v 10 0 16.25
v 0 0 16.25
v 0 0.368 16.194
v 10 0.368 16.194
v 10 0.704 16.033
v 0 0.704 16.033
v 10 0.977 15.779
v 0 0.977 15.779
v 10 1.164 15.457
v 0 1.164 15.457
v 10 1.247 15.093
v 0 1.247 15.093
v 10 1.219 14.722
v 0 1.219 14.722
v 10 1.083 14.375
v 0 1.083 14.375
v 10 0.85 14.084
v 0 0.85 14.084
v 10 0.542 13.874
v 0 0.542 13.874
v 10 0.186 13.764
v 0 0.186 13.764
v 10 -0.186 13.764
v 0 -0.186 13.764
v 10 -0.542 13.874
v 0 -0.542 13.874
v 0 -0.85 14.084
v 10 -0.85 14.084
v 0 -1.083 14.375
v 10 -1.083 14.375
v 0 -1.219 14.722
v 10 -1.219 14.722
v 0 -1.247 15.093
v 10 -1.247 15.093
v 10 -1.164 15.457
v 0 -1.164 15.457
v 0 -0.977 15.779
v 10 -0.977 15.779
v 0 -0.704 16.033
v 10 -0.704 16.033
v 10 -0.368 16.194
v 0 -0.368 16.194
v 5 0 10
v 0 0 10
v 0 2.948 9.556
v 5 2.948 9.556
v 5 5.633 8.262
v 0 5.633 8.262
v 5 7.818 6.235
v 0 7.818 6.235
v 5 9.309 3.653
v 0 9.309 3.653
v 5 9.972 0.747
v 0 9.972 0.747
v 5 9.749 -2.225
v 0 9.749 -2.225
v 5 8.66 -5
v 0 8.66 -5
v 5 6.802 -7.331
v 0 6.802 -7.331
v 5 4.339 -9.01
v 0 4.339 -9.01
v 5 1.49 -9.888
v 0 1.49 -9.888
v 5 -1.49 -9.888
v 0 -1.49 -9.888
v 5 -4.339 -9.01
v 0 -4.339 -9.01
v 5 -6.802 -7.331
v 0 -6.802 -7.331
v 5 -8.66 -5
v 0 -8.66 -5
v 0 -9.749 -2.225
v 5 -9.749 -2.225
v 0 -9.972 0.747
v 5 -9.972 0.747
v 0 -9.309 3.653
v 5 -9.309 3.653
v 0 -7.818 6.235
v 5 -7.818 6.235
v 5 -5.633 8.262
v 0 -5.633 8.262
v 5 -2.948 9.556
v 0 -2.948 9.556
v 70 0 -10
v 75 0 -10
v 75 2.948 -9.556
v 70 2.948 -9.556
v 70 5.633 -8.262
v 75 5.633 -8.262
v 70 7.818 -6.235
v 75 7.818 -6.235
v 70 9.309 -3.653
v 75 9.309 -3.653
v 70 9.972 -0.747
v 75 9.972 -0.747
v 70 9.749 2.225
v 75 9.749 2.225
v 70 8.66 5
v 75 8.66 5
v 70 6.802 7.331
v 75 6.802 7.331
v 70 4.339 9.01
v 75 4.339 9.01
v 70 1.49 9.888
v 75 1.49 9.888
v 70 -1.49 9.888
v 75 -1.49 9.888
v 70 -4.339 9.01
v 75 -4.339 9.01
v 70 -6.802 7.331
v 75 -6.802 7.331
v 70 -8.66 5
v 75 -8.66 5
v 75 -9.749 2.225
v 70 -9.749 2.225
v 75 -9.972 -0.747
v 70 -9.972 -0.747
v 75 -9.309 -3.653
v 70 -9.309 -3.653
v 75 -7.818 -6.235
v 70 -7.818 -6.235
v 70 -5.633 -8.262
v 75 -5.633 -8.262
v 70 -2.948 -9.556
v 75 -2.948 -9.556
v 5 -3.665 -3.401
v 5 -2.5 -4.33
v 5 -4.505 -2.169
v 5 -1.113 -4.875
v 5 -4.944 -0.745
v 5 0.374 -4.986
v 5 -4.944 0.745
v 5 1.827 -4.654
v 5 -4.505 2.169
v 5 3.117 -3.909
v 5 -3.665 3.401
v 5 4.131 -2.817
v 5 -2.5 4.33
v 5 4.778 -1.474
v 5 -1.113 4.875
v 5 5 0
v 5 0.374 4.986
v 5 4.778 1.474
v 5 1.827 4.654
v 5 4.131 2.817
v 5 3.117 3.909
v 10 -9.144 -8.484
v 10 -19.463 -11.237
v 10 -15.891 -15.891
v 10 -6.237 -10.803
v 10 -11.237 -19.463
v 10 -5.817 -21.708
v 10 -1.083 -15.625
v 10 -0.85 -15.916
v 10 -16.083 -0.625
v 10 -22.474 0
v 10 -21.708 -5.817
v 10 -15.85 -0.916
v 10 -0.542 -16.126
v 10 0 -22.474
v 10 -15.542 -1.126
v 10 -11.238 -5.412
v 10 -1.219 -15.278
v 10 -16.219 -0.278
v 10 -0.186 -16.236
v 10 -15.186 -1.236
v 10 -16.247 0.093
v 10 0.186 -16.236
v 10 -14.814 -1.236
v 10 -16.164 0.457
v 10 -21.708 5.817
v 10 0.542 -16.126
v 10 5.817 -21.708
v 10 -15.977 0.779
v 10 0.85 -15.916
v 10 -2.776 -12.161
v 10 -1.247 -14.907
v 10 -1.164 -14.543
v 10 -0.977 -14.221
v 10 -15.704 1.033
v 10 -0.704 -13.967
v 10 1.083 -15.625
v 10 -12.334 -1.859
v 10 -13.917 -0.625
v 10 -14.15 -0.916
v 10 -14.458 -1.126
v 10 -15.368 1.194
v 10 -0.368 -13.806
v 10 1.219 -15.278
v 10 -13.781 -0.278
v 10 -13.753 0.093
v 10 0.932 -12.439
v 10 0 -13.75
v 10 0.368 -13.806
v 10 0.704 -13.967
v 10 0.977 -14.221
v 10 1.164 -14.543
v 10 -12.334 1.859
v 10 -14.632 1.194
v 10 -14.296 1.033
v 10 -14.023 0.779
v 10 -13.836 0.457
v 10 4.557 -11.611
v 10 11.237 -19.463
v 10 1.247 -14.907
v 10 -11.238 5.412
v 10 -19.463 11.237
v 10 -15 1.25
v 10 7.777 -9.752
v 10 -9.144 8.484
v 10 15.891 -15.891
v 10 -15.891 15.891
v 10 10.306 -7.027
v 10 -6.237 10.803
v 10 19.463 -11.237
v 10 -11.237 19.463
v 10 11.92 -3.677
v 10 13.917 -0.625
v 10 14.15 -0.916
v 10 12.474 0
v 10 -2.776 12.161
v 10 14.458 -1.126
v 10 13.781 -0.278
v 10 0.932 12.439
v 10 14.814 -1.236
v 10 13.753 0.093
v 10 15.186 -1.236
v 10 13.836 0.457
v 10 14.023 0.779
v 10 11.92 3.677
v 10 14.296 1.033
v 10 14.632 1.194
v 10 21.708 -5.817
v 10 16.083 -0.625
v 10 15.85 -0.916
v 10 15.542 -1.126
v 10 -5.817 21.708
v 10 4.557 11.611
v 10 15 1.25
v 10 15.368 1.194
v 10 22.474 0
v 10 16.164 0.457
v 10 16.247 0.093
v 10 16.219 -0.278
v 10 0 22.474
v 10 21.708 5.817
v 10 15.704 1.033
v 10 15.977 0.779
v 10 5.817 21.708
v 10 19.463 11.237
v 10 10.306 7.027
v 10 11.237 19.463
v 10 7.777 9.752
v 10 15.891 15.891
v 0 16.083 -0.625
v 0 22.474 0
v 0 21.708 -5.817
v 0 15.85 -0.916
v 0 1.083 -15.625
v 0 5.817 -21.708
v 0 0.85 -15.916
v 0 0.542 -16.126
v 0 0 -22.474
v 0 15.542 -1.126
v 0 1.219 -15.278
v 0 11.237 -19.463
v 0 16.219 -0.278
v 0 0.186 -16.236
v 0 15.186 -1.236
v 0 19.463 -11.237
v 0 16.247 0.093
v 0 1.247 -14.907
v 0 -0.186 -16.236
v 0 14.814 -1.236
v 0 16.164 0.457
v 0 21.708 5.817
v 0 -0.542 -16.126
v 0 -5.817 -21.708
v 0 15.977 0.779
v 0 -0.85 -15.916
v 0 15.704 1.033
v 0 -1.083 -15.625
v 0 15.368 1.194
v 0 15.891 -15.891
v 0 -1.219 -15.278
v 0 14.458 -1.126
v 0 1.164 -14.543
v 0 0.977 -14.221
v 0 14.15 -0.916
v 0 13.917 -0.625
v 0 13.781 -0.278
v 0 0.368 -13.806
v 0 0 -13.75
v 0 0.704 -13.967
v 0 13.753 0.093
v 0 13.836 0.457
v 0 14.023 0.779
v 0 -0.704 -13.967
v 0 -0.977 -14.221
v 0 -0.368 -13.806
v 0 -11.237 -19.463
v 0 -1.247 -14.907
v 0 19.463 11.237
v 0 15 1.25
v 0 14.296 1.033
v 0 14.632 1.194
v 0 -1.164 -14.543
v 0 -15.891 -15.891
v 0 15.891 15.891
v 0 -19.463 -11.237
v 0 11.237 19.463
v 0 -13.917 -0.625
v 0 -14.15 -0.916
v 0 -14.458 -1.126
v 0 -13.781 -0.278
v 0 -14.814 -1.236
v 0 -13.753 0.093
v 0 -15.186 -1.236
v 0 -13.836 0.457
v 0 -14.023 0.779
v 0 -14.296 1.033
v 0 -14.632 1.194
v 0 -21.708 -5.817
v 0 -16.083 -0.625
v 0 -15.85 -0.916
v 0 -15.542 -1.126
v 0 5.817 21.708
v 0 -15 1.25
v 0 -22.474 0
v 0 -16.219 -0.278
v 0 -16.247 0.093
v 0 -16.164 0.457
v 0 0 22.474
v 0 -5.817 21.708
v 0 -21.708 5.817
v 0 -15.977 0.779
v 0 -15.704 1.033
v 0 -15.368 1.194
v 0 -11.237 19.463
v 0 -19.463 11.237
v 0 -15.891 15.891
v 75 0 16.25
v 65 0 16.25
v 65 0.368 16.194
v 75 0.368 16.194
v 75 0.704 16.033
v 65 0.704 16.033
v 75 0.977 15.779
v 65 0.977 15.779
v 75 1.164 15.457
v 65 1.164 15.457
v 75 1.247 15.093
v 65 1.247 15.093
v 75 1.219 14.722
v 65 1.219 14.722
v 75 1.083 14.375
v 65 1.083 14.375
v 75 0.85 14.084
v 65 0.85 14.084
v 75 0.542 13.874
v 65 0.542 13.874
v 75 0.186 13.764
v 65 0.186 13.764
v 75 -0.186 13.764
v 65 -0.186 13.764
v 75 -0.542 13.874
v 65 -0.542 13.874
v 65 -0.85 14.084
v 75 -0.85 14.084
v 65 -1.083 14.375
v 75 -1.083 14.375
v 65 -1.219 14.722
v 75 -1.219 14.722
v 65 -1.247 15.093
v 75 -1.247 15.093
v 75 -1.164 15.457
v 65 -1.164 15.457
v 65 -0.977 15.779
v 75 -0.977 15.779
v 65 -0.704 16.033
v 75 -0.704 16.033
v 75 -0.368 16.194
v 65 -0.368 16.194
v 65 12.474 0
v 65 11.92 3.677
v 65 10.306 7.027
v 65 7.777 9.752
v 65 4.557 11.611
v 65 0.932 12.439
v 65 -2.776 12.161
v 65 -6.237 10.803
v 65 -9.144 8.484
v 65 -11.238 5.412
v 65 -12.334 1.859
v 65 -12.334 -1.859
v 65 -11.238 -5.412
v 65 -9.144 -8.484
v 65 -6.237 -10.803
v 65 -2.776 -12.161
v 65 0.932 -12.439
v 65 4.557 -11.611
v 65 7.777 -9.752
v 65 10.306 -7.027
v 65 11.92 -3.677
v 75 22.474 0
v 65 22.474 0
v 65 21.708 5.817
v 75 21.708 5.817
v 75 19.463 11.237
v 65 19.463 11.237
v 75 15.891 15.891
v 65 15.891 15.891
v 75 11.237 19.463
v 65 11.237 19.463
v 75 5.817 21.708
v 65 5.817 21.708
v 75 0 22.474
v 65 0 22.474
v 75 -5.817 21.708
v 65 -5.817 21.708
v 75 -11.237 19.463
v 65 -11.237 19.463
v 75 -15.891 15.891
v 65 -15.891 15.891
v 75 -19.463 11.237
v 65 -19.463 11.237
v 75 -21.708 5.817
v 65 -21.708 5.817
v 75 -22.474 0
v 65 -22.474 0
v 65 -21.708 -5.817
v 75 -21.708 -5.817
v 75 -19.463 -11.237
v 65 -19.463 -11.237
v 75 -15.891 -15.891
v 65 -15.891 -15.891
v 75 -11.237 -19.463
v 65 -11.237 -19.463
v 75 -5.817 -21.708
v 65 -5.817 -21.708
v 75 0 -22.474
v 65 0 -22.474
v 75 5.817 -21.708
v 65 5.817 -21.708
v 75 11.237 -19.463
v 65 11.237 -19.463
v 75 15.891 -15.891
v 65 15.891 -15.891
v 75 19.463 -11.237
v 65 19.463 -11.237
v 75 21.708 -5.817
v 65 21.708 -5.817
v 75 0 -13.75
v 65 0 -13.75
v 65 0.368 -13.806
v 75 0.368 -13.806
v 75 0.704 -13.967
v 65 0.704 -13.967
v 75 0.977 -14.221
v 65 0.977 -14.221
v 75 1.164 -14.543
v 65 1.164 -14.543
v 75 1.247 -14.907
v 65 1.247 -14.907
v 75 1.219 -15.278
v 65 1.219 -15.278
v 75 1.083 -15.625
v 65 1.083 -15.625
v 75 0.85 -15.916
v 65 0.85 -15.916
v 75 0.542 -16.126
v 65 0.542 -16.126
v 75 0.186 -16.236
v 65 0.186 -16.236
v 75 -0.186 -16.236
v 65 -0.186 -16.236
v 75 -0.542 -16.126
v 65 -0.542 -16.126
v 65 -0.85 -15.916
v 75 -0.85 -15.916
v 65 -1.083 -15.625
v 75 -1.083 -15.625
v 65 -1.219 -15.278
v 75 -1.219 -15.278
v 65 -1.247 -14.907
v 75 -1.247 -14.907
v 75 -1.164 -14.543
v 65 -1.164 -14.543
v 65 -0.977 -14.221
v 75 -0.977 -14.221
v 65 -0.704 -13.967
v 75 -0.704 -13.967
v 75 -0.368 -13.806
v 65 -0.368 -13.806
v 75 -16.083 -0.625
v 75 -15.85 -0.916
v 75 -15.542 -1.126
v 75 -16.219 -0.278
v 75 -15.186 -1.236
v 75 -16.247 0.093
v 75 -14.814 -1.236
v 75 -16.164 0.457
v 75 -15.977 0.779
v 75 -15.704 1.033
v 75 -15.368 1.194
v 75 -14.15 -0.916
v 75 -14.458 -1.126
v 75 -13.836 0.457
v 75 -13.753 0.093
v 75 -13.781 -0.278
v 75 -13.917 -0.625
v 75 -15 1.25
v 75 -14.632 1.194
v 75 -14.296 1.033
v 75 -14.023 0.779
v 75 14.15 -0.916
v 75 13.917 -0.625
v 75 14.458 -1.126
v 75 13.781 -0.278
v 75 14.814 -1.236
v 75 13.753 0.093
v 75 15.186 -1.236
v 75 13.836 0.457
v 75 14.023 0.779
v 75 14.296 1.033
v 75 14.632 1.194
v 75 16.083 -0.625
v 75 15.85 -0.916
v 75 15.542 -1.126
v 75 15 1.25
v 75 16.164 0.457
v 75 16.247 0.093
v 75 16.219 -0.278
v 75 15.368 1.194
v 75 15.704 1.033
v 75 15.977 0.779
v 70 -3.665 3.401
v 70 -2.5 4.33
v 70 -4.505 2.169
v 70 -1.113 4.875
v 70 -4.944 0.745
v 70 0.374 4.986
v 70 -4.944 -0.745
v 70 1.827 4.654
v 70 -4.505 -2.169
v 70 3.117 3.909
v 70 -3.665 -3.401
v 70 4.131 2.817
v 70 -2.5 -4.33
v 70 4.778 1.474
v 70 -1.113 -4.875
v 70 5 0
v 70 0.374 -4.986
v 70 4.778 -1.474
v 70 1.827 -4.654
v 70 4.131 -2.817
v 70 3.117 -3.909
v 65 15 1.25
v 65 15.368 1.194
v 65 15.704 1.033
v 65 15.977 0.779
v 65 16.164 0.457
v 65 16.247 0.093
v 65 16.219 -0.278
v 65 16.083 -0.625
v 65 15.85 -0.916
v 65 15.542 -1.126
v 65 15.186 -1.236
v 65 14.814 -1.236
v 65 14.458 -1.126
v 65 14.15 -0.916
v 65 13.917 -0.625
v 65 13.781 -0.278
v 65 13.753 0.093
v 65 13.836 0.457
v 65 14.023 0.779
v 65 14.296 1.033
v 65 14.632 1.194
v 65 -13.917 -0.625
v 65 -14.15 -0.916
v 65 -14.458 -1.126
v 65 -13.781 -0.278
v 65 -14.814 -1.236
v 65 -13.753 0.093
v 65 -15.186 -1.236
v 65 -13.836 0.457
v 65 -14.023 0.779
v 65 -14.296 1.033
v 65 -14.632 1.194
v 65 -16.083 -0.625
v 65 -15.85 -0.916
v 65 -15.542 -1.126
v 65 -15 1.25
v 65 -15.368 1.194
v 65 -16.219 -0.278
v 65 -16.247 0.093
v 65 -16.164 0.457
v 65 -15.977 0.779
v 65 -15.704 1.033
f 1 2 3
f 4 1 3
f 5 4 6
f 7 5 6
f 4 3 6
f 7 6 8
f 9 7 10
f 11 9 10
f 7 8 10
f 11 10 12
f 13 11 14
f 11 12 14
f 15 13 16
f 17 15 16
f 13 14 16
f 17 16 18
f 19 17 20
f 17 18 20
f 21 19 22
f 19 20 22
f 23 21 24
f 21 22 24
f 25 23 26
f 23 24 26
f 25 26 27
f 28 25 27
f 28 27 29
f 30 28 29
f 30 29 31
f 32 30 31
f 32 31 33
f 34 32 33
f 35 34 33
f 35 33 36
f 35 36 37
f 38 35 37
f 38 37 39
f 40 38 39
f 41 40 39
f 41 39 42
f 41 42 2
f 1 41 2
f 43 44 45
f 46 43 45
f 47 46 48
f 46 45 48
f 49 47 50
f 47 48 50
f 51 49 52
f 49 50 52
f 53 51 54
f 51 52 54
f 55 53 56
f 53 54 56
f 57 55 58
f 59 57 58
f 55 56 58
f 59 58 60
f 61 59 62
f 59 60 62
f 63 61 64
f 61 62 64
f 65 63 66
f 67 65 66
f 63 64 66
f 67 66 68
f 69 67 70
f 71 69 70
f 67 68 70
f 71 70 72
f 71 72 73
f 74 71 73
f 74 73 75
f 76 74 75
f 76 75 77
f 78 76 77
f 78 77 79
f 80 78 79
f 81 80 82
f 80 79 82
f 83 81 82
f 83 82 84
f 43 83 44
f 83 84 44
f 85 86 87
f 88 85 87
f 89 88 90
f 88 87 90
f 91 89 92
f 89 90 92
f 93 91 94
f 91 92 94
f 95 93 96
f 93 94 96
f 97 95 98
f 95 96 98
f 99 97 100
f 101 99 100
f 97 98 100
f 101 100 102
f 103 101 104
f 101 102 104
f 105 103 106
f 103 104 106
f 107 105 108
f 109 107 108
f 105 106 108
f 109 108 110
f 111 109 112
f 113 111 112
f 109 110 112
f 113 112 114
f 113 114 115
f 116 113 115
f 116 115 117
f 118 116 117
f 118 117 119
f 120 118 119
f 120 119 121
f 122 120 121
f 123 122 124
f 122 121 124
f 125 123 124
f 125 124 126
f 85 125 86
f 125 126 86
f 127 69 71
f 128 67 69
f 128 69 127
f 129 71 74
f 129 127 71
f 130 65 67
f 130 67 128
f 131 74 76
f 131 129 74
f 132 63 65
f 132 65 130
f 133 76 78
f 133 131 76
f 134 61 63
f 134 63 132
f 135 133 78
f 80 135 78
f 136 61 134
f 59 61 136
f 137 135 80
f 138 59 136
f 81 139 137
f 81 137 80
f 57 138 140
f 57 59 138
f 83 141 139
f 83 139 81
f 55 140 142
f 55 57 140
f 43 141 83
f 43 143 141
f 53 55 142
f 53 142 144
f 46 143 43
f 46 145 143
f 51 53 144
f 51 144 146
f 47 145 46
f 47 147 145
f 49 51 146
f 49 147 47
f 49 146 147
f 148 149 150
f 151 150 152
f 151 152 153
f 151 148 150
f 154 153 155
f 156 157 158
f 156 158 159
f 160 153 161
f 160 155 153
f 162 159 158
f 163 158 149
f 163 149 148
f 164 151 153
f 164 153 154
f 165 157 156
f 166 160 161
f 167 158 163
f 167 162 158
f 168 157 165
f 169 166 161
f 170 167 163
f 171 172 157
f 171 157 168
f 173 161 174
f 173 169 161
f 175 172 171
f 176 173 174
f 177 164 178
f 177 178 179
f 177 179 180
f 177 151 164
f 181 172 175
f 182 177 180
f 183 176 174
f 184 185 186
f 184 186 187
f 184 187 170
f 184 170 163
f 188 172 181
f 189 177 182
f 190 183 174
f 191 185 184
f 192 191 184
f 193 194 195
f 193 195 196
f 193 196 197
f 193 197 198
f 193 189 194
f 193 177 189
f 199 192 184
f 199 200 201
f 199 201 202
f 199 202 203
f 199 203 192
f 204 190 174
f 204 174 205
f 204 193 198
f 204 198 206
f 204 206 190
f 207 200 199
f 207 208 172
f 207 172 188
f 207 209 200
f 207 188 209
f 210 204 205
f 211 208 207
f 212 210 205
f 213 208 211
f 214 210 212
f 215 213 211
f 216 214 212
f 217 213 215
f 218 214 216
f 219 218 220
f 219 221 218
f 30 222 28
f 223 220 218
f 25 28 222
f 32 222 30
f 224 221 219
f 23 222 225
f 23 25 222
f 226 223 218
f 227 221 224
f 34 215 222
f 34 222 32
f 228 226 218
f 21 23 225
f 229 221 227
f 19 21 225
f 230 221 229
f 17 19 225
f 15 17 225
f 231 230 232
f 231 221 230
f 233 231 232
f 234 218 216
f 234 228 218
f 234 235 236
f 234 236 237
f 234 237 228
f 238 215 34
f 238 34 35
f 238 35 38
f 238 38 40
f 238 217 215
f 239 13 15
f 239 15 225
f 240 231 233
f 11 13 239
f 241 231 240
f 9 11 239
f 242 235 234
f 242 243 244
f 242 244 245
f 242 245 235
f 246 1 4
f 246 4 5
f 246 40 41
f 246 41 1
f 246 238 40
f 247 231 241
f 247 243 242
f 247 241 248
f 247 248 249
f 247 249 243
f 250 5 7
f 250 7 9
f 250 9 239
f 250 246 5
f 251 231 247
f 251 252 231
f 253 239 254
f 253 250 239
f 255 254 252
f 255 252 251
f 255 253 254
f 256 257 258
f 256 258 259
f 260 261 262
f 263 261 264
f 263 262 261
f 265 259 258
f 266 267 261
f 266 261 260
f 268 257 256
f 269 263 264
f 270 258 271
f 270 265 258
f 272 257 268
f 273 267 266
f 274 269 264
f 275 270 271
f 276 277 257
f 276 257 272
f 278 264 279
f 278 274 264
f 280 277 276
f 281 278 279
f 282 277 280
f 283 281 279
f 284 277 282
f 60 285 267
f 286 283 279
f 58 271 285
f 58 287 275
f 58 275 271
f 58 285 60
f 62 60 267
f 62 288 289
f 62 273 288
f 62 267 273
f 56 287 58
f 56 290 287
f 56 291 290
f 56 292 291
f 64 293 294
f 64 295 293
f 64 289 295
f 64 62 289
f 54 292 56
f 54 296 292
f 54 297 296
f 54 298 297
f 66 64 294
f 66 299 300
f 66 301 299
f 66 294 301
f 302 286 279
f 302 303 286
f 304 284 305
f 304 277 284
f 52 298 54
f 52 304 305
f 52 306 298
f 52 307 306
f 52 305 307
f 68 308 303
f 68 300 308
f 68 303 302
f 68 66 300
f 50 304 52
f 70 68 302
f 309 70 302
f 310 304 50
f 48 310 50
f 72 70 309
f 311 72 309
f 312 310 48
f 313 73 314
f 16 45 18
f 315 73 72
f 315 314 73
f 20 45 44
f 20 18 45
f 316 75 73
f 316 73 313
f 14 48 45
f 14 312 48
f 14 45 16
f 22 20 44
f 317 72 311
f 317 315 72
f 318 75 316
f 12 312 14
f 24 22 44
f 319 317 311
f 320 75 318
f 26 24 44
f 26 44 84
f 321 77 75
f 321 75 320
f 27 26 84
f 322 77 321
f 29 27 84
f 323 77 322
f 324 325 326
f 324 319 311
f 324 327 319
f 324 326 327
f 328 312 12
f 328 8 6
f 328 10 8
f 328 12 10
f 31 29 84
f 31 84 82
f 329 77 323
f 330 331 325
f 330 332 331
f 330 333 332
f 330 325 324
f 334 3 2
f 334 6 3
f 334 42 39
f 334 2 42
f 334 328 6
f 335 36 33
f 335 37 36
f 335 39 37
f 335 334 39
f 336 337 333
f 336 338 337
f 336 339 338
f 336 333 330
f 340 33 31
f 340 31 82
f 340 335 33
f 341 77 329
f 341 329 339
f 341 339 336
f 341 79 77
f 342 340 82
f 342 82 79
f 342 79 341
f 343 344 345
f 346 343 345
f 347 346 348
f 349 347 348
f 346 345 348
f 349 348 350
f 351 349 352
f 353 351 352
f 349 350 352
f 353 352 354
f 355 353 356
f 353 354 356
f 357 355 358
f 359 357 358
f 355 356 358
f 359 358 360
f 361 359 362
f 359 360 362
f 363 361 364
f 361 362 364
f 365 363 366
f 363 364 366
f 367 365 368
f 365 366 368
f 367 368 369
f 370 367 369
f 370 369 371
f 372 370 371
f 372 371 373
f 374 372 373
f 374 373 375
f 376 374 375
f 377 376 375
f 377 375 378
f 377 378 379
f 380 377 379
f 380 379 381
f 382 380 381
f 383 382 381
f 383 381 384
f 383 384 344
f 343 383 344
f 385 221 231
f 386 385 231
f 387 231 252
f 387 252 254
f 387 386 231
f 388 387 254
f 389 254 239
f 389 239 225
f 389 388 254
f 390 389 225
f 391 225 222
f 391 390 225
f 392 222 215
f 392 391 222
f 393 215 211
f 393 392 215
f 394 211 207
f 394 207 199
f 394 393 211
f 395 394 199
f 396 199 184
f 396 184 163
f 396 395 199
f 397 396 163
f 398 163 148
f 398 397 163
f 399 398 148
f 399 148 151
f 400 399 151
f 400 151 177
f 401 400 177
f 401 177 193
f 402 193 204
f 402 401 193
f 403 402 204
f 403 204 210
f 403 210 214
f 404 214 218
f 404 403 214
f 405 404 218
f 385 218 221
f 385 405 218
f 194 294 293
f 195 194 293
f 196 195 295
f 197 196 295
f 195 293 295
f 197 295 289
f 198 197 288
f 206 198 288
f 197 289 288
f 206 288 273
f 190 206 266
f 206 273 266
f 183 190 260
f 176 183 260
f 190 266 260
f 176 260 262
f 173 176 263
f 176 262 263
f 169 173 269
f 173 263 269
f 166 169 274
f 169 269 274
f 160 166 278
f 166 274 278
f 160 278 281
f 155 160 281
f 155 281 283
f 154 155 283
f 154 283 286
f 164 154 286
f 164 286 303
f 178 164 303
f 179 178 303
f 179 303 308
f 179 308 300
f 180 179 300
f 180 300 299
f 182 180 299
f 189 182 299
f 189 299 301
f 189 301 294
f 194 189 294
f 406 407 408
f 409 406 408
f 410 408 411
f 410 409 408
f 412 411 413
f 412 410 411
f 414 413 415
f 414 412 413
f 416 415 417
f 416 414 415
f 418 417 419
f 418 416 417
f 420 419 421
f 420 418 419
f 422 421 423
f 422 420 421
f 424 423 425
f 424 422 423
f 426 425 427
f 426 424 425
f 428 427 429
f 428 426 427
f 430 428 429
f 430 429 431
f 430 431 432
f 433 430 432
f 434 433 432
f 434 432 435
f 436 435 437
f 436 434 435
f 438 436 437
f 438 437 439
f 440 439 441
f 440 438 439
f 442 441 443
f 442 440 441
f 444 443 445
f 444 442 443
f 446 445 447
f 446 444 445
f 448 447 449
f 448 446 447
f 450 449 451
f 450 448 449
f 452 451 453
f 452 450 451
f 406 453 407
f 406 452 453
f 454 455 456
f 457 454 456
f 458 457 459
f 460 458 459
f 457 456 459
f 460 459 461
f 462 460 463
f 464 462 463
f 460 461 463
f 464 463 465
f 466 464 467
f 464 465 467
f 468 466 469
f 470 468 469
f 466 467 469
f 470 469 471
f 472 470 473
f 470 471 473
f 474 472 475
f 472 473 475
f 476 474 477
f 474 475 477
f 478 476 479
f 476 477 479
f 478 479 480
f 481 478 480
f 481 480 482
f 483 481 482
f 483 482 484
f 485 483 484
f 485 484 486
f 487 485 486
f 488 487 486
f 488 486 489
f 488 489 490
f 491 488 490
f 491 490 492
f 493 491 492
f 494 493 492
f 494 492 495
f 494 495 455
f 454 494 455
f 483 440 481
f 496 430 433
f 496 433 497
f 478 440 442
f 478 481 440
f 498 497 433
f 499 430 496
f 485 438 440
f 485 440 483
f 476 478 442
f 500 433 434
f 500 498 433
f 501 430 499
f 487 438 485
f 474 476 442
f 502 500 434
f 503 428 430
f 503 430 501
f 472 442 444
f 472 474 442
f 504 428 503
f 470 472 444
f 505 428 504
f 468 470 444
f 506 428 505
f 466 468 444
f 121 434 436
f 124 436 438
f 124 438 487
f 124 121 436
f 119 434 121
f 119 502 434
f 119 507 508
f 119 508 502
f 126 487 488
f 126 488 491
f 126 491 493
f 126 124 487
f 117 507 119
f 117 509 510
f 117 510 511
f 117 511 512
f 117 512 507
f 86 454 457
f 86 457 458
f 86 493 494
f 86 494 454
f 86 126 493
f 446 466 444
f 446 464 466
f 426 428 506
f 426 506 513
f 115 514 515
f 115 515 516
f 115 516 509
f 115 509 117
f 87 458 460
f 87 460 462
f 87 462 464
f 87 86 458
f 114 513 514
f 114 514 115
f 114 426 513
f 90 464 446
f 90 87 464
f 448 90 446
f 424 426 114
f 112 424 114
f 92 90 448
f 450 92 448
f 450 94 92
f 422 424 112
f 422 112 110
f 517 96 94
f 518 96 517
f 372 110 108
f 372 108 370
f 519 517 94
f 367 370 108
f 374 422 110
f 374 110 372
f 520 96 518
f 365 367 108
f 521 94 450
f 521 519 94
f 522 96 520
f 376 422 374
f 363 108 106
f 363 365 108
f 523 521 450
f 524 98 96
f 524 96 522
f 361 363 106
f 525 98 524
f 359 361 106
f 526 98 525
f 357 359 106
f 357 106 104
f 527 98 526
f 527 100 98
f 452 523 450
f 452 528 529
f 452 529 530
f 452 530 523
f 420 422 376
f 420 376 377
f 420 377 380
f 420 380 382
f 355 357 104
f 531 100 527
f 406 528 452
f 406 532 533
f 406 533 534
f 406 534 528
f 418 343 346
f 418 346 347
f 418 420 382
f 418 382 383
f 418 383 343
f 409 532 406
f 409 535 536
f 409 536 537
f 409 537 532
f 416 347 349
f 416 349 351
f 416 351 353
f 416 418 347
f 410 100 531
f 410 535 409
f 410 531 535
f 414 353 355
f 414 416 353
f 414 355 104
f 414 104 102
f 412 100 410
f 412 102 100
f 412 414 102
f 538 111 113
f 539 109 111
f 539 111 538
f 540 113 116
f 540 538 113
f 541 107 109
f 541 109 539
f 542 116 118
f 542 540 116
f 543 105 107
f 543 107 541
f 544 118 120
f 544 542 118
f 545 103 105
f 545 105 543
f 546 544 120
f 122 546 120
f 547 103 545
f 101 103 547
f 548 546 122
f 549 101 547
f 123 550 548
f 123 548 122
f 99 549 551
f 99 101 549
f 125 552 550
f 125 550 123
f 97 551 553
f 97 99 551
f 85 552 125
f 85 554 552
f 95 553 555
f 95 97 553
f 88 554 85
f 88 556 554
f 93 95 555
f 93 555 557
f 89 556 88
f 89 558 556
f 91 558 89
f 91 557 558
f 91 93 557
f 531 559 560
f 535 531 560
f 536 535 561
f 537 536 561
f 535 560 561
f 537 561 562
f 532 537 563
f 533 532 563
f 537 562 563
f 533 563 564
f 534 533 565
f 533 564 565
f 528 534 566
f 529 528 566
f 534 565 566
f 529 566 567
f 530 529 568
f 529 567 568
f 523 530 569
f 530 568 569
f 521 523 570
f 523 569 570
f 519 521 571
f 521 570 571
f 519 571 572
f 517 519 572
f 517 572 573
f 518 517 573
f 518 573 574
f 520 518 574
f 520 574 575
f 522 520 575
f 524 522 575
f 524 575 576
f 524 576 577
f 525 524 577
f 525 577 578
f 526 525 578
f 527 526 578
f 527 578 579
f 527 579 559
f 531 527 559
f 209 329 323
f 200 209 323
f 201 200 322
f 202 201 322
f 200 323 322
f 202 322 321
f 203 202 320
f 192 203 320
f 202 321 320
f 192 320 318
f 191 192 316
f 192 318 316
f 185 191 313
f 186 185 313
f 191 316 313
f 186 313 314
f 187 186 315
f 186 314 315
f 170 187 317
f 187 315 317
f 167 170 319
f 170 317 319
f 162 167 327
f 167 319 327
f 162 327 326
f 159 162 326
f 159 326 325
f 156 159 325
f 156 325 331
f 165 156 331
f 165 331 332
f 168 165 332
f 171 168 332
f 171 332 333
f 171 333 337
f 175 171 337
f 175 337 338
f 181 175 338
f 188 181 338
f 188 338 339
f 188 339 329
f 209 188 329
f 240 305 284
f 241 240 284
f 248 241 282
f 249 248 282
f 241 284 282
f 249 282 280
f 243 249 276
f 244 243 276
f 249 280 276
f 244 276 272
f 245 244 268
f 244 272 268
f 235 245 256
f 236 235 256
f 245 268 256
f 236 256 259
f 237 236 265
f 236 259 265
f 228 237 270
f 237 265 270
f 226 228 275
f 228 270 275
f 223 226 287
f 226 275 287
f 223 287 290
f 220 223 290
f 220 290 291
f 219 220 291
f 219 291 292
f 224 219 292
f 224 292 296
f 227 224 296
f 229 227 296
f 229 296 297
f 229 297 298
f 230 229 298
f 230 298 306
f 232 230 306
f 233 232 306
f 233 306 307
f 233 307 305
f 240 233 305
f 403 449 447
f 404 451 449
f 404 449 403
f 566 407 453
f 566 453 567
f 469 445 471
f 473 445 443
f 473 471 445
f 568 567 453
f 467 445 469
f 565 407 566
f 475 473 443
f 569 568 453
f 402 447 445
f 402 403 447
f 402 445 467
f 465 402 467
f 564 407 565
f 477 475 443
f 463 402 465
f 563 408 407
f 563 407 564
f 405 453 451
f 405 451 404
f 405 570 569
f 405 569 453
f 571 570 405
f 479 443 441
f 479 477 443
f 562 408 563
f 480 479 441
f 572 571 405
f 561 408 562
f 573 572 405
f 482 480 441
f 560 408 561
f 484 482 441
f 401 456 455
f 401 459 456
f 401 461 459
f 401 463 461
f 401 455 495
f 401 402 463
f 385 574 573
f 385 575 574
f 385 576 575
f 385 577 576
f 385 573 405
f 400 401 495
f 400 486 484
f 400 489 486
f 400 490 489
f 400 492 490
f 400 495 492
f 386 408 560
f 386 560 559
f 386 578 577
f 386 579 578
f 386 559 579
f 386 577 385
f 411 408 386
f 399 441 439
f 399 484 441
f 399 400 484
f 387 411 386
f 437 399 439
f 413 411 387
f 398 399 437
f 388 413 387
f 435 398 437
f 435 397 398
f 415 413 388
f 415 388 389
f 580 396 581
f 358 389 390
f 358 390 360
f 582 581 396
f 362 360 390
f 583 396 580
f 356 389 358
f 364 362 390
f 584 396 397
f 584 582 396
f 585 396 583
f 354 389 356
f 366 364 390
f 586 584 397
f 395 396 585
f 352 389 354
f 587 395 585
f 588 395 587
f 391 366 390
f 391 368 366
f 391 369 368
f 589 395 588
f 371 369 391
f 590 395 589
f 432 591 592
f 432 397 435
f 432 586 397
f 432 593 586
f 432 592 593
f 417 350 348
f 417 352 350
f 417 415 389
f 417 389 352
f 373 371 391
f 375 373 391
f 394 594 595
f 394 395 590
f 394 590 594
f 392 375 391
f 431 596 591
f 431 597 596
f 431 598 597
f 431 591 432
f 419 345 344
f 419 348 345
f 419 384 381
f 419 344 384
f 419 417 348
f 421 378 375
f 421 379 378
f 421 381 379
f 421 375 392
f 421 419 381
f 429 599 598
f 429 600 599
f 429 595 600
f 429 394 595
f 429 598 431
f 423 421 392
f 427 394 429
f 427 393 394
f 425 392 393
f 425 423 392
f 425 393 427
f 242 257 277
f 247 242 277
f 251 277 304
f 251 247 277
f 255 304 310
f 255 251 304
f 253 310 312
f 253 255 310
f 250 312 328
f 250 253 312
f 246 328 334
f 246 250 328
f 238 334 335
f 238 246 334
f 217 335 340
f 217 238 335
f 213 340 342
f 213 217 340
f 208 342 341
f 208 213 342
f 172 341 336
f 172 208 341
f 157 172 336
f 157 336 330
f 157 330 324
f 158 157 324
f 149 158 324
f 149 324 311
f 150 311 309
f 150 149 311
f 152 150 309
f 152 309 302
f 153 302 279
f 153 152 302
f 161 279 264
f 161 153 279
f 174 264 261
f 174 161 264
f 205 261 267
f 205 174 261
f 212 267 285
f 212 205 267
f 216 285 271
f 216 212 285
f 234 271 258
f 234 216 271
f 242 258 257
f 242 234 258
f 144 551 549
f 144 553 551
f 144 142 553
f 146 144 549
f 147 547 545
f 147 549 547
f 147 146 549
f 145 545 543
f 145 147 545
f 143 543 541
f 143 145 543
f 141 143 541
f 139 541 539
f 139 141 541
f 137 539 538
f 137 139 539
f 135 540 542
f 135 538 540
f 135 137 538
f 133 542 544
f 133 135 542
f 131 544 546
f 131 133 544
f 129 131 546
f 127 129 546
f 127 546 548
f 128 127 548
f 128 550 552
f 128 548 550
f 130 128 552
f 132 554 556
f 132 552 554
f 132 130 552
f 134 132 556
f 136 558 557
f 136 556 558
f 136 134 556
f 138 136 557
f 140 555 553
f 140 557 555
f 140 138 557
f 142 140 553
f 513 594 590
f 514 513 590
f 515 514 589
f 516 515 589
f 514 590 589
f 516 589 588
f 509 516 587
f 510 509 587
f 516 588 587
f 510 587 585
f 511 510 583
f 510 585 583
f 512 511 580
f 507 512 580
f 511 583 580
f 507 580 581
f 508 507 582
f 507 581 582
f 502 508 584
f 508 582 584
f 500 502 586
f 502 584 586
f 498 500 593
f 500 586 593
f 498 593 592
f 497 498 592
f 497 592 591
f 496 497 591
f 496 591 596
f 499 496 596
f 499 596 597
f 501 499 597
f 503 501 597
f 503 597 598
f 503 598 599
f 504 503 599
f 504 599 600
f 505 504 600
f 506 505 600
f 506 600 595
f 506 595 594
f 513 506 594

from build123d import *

# Parameters (mm, degrees)
SKETCH2_R          = 1.25
CUT_EXTRUDE1_DEPTH = 76
SKETCH3_R          = 10
CUT_EXTRUDE2_DEPTH = 5
SKETCH4_R          = 10
CUT_EXTRUDE3_DEPTH = 5


with BuildPart() as part:
    # Sketch1 → Revolve1 (revolve)
    with BuildSketch(Plane.XY):
        Polygon((0, 5), (0, 22.473684211), (10, 22.473684211), (10, 12.473684211), (65, 12.473684211), (65, 22.473684211), (75, 22.473684211), (75, 5), align=None)
    revolve(axis=Axis((0, 0, 0), (1, 0, 0)))

    # Sketch2 → Cut-Extrude1 (cut, through all)
    with BuildSketch(Plane.ZY):
        with Locations((0, 15)):
            Circle(SKETCH2_R)
        with Locations((-15, 0)):
            Circle(SKETCH2_R)
        with Locations((0, -15)):
            Circle(SKETCH2_R)
        with Locations((15, 0)):
            Circle(SKETCH2_R)
    extrude(amount=-CUT_EXTRUDE1_DEPTH, mode=Mode.SUBTRACT)

    # Sketch3 → Cut-Extrude2 (cut)
    with BuildSketch(Plane.ZY):
        Circle(SKETCH3_R)
    extrude(amount=-CUT_EXTRUDE2_DEPTH, mode=Mode.SUBTRACT)

    # Sketch4 → Cut-Extrude3 (cut)
    with BuildSketch(Plane(origin=(75, 0, 0), x_dir=(0, 0, -1), z_dir=(1, 0, 0))):
        Circle(SKETCH4_R)
    extrude(amount=-CUT_EXTRUDE3_DEPTH, mode=Mode.SUBTRACT)


solid = part.part
